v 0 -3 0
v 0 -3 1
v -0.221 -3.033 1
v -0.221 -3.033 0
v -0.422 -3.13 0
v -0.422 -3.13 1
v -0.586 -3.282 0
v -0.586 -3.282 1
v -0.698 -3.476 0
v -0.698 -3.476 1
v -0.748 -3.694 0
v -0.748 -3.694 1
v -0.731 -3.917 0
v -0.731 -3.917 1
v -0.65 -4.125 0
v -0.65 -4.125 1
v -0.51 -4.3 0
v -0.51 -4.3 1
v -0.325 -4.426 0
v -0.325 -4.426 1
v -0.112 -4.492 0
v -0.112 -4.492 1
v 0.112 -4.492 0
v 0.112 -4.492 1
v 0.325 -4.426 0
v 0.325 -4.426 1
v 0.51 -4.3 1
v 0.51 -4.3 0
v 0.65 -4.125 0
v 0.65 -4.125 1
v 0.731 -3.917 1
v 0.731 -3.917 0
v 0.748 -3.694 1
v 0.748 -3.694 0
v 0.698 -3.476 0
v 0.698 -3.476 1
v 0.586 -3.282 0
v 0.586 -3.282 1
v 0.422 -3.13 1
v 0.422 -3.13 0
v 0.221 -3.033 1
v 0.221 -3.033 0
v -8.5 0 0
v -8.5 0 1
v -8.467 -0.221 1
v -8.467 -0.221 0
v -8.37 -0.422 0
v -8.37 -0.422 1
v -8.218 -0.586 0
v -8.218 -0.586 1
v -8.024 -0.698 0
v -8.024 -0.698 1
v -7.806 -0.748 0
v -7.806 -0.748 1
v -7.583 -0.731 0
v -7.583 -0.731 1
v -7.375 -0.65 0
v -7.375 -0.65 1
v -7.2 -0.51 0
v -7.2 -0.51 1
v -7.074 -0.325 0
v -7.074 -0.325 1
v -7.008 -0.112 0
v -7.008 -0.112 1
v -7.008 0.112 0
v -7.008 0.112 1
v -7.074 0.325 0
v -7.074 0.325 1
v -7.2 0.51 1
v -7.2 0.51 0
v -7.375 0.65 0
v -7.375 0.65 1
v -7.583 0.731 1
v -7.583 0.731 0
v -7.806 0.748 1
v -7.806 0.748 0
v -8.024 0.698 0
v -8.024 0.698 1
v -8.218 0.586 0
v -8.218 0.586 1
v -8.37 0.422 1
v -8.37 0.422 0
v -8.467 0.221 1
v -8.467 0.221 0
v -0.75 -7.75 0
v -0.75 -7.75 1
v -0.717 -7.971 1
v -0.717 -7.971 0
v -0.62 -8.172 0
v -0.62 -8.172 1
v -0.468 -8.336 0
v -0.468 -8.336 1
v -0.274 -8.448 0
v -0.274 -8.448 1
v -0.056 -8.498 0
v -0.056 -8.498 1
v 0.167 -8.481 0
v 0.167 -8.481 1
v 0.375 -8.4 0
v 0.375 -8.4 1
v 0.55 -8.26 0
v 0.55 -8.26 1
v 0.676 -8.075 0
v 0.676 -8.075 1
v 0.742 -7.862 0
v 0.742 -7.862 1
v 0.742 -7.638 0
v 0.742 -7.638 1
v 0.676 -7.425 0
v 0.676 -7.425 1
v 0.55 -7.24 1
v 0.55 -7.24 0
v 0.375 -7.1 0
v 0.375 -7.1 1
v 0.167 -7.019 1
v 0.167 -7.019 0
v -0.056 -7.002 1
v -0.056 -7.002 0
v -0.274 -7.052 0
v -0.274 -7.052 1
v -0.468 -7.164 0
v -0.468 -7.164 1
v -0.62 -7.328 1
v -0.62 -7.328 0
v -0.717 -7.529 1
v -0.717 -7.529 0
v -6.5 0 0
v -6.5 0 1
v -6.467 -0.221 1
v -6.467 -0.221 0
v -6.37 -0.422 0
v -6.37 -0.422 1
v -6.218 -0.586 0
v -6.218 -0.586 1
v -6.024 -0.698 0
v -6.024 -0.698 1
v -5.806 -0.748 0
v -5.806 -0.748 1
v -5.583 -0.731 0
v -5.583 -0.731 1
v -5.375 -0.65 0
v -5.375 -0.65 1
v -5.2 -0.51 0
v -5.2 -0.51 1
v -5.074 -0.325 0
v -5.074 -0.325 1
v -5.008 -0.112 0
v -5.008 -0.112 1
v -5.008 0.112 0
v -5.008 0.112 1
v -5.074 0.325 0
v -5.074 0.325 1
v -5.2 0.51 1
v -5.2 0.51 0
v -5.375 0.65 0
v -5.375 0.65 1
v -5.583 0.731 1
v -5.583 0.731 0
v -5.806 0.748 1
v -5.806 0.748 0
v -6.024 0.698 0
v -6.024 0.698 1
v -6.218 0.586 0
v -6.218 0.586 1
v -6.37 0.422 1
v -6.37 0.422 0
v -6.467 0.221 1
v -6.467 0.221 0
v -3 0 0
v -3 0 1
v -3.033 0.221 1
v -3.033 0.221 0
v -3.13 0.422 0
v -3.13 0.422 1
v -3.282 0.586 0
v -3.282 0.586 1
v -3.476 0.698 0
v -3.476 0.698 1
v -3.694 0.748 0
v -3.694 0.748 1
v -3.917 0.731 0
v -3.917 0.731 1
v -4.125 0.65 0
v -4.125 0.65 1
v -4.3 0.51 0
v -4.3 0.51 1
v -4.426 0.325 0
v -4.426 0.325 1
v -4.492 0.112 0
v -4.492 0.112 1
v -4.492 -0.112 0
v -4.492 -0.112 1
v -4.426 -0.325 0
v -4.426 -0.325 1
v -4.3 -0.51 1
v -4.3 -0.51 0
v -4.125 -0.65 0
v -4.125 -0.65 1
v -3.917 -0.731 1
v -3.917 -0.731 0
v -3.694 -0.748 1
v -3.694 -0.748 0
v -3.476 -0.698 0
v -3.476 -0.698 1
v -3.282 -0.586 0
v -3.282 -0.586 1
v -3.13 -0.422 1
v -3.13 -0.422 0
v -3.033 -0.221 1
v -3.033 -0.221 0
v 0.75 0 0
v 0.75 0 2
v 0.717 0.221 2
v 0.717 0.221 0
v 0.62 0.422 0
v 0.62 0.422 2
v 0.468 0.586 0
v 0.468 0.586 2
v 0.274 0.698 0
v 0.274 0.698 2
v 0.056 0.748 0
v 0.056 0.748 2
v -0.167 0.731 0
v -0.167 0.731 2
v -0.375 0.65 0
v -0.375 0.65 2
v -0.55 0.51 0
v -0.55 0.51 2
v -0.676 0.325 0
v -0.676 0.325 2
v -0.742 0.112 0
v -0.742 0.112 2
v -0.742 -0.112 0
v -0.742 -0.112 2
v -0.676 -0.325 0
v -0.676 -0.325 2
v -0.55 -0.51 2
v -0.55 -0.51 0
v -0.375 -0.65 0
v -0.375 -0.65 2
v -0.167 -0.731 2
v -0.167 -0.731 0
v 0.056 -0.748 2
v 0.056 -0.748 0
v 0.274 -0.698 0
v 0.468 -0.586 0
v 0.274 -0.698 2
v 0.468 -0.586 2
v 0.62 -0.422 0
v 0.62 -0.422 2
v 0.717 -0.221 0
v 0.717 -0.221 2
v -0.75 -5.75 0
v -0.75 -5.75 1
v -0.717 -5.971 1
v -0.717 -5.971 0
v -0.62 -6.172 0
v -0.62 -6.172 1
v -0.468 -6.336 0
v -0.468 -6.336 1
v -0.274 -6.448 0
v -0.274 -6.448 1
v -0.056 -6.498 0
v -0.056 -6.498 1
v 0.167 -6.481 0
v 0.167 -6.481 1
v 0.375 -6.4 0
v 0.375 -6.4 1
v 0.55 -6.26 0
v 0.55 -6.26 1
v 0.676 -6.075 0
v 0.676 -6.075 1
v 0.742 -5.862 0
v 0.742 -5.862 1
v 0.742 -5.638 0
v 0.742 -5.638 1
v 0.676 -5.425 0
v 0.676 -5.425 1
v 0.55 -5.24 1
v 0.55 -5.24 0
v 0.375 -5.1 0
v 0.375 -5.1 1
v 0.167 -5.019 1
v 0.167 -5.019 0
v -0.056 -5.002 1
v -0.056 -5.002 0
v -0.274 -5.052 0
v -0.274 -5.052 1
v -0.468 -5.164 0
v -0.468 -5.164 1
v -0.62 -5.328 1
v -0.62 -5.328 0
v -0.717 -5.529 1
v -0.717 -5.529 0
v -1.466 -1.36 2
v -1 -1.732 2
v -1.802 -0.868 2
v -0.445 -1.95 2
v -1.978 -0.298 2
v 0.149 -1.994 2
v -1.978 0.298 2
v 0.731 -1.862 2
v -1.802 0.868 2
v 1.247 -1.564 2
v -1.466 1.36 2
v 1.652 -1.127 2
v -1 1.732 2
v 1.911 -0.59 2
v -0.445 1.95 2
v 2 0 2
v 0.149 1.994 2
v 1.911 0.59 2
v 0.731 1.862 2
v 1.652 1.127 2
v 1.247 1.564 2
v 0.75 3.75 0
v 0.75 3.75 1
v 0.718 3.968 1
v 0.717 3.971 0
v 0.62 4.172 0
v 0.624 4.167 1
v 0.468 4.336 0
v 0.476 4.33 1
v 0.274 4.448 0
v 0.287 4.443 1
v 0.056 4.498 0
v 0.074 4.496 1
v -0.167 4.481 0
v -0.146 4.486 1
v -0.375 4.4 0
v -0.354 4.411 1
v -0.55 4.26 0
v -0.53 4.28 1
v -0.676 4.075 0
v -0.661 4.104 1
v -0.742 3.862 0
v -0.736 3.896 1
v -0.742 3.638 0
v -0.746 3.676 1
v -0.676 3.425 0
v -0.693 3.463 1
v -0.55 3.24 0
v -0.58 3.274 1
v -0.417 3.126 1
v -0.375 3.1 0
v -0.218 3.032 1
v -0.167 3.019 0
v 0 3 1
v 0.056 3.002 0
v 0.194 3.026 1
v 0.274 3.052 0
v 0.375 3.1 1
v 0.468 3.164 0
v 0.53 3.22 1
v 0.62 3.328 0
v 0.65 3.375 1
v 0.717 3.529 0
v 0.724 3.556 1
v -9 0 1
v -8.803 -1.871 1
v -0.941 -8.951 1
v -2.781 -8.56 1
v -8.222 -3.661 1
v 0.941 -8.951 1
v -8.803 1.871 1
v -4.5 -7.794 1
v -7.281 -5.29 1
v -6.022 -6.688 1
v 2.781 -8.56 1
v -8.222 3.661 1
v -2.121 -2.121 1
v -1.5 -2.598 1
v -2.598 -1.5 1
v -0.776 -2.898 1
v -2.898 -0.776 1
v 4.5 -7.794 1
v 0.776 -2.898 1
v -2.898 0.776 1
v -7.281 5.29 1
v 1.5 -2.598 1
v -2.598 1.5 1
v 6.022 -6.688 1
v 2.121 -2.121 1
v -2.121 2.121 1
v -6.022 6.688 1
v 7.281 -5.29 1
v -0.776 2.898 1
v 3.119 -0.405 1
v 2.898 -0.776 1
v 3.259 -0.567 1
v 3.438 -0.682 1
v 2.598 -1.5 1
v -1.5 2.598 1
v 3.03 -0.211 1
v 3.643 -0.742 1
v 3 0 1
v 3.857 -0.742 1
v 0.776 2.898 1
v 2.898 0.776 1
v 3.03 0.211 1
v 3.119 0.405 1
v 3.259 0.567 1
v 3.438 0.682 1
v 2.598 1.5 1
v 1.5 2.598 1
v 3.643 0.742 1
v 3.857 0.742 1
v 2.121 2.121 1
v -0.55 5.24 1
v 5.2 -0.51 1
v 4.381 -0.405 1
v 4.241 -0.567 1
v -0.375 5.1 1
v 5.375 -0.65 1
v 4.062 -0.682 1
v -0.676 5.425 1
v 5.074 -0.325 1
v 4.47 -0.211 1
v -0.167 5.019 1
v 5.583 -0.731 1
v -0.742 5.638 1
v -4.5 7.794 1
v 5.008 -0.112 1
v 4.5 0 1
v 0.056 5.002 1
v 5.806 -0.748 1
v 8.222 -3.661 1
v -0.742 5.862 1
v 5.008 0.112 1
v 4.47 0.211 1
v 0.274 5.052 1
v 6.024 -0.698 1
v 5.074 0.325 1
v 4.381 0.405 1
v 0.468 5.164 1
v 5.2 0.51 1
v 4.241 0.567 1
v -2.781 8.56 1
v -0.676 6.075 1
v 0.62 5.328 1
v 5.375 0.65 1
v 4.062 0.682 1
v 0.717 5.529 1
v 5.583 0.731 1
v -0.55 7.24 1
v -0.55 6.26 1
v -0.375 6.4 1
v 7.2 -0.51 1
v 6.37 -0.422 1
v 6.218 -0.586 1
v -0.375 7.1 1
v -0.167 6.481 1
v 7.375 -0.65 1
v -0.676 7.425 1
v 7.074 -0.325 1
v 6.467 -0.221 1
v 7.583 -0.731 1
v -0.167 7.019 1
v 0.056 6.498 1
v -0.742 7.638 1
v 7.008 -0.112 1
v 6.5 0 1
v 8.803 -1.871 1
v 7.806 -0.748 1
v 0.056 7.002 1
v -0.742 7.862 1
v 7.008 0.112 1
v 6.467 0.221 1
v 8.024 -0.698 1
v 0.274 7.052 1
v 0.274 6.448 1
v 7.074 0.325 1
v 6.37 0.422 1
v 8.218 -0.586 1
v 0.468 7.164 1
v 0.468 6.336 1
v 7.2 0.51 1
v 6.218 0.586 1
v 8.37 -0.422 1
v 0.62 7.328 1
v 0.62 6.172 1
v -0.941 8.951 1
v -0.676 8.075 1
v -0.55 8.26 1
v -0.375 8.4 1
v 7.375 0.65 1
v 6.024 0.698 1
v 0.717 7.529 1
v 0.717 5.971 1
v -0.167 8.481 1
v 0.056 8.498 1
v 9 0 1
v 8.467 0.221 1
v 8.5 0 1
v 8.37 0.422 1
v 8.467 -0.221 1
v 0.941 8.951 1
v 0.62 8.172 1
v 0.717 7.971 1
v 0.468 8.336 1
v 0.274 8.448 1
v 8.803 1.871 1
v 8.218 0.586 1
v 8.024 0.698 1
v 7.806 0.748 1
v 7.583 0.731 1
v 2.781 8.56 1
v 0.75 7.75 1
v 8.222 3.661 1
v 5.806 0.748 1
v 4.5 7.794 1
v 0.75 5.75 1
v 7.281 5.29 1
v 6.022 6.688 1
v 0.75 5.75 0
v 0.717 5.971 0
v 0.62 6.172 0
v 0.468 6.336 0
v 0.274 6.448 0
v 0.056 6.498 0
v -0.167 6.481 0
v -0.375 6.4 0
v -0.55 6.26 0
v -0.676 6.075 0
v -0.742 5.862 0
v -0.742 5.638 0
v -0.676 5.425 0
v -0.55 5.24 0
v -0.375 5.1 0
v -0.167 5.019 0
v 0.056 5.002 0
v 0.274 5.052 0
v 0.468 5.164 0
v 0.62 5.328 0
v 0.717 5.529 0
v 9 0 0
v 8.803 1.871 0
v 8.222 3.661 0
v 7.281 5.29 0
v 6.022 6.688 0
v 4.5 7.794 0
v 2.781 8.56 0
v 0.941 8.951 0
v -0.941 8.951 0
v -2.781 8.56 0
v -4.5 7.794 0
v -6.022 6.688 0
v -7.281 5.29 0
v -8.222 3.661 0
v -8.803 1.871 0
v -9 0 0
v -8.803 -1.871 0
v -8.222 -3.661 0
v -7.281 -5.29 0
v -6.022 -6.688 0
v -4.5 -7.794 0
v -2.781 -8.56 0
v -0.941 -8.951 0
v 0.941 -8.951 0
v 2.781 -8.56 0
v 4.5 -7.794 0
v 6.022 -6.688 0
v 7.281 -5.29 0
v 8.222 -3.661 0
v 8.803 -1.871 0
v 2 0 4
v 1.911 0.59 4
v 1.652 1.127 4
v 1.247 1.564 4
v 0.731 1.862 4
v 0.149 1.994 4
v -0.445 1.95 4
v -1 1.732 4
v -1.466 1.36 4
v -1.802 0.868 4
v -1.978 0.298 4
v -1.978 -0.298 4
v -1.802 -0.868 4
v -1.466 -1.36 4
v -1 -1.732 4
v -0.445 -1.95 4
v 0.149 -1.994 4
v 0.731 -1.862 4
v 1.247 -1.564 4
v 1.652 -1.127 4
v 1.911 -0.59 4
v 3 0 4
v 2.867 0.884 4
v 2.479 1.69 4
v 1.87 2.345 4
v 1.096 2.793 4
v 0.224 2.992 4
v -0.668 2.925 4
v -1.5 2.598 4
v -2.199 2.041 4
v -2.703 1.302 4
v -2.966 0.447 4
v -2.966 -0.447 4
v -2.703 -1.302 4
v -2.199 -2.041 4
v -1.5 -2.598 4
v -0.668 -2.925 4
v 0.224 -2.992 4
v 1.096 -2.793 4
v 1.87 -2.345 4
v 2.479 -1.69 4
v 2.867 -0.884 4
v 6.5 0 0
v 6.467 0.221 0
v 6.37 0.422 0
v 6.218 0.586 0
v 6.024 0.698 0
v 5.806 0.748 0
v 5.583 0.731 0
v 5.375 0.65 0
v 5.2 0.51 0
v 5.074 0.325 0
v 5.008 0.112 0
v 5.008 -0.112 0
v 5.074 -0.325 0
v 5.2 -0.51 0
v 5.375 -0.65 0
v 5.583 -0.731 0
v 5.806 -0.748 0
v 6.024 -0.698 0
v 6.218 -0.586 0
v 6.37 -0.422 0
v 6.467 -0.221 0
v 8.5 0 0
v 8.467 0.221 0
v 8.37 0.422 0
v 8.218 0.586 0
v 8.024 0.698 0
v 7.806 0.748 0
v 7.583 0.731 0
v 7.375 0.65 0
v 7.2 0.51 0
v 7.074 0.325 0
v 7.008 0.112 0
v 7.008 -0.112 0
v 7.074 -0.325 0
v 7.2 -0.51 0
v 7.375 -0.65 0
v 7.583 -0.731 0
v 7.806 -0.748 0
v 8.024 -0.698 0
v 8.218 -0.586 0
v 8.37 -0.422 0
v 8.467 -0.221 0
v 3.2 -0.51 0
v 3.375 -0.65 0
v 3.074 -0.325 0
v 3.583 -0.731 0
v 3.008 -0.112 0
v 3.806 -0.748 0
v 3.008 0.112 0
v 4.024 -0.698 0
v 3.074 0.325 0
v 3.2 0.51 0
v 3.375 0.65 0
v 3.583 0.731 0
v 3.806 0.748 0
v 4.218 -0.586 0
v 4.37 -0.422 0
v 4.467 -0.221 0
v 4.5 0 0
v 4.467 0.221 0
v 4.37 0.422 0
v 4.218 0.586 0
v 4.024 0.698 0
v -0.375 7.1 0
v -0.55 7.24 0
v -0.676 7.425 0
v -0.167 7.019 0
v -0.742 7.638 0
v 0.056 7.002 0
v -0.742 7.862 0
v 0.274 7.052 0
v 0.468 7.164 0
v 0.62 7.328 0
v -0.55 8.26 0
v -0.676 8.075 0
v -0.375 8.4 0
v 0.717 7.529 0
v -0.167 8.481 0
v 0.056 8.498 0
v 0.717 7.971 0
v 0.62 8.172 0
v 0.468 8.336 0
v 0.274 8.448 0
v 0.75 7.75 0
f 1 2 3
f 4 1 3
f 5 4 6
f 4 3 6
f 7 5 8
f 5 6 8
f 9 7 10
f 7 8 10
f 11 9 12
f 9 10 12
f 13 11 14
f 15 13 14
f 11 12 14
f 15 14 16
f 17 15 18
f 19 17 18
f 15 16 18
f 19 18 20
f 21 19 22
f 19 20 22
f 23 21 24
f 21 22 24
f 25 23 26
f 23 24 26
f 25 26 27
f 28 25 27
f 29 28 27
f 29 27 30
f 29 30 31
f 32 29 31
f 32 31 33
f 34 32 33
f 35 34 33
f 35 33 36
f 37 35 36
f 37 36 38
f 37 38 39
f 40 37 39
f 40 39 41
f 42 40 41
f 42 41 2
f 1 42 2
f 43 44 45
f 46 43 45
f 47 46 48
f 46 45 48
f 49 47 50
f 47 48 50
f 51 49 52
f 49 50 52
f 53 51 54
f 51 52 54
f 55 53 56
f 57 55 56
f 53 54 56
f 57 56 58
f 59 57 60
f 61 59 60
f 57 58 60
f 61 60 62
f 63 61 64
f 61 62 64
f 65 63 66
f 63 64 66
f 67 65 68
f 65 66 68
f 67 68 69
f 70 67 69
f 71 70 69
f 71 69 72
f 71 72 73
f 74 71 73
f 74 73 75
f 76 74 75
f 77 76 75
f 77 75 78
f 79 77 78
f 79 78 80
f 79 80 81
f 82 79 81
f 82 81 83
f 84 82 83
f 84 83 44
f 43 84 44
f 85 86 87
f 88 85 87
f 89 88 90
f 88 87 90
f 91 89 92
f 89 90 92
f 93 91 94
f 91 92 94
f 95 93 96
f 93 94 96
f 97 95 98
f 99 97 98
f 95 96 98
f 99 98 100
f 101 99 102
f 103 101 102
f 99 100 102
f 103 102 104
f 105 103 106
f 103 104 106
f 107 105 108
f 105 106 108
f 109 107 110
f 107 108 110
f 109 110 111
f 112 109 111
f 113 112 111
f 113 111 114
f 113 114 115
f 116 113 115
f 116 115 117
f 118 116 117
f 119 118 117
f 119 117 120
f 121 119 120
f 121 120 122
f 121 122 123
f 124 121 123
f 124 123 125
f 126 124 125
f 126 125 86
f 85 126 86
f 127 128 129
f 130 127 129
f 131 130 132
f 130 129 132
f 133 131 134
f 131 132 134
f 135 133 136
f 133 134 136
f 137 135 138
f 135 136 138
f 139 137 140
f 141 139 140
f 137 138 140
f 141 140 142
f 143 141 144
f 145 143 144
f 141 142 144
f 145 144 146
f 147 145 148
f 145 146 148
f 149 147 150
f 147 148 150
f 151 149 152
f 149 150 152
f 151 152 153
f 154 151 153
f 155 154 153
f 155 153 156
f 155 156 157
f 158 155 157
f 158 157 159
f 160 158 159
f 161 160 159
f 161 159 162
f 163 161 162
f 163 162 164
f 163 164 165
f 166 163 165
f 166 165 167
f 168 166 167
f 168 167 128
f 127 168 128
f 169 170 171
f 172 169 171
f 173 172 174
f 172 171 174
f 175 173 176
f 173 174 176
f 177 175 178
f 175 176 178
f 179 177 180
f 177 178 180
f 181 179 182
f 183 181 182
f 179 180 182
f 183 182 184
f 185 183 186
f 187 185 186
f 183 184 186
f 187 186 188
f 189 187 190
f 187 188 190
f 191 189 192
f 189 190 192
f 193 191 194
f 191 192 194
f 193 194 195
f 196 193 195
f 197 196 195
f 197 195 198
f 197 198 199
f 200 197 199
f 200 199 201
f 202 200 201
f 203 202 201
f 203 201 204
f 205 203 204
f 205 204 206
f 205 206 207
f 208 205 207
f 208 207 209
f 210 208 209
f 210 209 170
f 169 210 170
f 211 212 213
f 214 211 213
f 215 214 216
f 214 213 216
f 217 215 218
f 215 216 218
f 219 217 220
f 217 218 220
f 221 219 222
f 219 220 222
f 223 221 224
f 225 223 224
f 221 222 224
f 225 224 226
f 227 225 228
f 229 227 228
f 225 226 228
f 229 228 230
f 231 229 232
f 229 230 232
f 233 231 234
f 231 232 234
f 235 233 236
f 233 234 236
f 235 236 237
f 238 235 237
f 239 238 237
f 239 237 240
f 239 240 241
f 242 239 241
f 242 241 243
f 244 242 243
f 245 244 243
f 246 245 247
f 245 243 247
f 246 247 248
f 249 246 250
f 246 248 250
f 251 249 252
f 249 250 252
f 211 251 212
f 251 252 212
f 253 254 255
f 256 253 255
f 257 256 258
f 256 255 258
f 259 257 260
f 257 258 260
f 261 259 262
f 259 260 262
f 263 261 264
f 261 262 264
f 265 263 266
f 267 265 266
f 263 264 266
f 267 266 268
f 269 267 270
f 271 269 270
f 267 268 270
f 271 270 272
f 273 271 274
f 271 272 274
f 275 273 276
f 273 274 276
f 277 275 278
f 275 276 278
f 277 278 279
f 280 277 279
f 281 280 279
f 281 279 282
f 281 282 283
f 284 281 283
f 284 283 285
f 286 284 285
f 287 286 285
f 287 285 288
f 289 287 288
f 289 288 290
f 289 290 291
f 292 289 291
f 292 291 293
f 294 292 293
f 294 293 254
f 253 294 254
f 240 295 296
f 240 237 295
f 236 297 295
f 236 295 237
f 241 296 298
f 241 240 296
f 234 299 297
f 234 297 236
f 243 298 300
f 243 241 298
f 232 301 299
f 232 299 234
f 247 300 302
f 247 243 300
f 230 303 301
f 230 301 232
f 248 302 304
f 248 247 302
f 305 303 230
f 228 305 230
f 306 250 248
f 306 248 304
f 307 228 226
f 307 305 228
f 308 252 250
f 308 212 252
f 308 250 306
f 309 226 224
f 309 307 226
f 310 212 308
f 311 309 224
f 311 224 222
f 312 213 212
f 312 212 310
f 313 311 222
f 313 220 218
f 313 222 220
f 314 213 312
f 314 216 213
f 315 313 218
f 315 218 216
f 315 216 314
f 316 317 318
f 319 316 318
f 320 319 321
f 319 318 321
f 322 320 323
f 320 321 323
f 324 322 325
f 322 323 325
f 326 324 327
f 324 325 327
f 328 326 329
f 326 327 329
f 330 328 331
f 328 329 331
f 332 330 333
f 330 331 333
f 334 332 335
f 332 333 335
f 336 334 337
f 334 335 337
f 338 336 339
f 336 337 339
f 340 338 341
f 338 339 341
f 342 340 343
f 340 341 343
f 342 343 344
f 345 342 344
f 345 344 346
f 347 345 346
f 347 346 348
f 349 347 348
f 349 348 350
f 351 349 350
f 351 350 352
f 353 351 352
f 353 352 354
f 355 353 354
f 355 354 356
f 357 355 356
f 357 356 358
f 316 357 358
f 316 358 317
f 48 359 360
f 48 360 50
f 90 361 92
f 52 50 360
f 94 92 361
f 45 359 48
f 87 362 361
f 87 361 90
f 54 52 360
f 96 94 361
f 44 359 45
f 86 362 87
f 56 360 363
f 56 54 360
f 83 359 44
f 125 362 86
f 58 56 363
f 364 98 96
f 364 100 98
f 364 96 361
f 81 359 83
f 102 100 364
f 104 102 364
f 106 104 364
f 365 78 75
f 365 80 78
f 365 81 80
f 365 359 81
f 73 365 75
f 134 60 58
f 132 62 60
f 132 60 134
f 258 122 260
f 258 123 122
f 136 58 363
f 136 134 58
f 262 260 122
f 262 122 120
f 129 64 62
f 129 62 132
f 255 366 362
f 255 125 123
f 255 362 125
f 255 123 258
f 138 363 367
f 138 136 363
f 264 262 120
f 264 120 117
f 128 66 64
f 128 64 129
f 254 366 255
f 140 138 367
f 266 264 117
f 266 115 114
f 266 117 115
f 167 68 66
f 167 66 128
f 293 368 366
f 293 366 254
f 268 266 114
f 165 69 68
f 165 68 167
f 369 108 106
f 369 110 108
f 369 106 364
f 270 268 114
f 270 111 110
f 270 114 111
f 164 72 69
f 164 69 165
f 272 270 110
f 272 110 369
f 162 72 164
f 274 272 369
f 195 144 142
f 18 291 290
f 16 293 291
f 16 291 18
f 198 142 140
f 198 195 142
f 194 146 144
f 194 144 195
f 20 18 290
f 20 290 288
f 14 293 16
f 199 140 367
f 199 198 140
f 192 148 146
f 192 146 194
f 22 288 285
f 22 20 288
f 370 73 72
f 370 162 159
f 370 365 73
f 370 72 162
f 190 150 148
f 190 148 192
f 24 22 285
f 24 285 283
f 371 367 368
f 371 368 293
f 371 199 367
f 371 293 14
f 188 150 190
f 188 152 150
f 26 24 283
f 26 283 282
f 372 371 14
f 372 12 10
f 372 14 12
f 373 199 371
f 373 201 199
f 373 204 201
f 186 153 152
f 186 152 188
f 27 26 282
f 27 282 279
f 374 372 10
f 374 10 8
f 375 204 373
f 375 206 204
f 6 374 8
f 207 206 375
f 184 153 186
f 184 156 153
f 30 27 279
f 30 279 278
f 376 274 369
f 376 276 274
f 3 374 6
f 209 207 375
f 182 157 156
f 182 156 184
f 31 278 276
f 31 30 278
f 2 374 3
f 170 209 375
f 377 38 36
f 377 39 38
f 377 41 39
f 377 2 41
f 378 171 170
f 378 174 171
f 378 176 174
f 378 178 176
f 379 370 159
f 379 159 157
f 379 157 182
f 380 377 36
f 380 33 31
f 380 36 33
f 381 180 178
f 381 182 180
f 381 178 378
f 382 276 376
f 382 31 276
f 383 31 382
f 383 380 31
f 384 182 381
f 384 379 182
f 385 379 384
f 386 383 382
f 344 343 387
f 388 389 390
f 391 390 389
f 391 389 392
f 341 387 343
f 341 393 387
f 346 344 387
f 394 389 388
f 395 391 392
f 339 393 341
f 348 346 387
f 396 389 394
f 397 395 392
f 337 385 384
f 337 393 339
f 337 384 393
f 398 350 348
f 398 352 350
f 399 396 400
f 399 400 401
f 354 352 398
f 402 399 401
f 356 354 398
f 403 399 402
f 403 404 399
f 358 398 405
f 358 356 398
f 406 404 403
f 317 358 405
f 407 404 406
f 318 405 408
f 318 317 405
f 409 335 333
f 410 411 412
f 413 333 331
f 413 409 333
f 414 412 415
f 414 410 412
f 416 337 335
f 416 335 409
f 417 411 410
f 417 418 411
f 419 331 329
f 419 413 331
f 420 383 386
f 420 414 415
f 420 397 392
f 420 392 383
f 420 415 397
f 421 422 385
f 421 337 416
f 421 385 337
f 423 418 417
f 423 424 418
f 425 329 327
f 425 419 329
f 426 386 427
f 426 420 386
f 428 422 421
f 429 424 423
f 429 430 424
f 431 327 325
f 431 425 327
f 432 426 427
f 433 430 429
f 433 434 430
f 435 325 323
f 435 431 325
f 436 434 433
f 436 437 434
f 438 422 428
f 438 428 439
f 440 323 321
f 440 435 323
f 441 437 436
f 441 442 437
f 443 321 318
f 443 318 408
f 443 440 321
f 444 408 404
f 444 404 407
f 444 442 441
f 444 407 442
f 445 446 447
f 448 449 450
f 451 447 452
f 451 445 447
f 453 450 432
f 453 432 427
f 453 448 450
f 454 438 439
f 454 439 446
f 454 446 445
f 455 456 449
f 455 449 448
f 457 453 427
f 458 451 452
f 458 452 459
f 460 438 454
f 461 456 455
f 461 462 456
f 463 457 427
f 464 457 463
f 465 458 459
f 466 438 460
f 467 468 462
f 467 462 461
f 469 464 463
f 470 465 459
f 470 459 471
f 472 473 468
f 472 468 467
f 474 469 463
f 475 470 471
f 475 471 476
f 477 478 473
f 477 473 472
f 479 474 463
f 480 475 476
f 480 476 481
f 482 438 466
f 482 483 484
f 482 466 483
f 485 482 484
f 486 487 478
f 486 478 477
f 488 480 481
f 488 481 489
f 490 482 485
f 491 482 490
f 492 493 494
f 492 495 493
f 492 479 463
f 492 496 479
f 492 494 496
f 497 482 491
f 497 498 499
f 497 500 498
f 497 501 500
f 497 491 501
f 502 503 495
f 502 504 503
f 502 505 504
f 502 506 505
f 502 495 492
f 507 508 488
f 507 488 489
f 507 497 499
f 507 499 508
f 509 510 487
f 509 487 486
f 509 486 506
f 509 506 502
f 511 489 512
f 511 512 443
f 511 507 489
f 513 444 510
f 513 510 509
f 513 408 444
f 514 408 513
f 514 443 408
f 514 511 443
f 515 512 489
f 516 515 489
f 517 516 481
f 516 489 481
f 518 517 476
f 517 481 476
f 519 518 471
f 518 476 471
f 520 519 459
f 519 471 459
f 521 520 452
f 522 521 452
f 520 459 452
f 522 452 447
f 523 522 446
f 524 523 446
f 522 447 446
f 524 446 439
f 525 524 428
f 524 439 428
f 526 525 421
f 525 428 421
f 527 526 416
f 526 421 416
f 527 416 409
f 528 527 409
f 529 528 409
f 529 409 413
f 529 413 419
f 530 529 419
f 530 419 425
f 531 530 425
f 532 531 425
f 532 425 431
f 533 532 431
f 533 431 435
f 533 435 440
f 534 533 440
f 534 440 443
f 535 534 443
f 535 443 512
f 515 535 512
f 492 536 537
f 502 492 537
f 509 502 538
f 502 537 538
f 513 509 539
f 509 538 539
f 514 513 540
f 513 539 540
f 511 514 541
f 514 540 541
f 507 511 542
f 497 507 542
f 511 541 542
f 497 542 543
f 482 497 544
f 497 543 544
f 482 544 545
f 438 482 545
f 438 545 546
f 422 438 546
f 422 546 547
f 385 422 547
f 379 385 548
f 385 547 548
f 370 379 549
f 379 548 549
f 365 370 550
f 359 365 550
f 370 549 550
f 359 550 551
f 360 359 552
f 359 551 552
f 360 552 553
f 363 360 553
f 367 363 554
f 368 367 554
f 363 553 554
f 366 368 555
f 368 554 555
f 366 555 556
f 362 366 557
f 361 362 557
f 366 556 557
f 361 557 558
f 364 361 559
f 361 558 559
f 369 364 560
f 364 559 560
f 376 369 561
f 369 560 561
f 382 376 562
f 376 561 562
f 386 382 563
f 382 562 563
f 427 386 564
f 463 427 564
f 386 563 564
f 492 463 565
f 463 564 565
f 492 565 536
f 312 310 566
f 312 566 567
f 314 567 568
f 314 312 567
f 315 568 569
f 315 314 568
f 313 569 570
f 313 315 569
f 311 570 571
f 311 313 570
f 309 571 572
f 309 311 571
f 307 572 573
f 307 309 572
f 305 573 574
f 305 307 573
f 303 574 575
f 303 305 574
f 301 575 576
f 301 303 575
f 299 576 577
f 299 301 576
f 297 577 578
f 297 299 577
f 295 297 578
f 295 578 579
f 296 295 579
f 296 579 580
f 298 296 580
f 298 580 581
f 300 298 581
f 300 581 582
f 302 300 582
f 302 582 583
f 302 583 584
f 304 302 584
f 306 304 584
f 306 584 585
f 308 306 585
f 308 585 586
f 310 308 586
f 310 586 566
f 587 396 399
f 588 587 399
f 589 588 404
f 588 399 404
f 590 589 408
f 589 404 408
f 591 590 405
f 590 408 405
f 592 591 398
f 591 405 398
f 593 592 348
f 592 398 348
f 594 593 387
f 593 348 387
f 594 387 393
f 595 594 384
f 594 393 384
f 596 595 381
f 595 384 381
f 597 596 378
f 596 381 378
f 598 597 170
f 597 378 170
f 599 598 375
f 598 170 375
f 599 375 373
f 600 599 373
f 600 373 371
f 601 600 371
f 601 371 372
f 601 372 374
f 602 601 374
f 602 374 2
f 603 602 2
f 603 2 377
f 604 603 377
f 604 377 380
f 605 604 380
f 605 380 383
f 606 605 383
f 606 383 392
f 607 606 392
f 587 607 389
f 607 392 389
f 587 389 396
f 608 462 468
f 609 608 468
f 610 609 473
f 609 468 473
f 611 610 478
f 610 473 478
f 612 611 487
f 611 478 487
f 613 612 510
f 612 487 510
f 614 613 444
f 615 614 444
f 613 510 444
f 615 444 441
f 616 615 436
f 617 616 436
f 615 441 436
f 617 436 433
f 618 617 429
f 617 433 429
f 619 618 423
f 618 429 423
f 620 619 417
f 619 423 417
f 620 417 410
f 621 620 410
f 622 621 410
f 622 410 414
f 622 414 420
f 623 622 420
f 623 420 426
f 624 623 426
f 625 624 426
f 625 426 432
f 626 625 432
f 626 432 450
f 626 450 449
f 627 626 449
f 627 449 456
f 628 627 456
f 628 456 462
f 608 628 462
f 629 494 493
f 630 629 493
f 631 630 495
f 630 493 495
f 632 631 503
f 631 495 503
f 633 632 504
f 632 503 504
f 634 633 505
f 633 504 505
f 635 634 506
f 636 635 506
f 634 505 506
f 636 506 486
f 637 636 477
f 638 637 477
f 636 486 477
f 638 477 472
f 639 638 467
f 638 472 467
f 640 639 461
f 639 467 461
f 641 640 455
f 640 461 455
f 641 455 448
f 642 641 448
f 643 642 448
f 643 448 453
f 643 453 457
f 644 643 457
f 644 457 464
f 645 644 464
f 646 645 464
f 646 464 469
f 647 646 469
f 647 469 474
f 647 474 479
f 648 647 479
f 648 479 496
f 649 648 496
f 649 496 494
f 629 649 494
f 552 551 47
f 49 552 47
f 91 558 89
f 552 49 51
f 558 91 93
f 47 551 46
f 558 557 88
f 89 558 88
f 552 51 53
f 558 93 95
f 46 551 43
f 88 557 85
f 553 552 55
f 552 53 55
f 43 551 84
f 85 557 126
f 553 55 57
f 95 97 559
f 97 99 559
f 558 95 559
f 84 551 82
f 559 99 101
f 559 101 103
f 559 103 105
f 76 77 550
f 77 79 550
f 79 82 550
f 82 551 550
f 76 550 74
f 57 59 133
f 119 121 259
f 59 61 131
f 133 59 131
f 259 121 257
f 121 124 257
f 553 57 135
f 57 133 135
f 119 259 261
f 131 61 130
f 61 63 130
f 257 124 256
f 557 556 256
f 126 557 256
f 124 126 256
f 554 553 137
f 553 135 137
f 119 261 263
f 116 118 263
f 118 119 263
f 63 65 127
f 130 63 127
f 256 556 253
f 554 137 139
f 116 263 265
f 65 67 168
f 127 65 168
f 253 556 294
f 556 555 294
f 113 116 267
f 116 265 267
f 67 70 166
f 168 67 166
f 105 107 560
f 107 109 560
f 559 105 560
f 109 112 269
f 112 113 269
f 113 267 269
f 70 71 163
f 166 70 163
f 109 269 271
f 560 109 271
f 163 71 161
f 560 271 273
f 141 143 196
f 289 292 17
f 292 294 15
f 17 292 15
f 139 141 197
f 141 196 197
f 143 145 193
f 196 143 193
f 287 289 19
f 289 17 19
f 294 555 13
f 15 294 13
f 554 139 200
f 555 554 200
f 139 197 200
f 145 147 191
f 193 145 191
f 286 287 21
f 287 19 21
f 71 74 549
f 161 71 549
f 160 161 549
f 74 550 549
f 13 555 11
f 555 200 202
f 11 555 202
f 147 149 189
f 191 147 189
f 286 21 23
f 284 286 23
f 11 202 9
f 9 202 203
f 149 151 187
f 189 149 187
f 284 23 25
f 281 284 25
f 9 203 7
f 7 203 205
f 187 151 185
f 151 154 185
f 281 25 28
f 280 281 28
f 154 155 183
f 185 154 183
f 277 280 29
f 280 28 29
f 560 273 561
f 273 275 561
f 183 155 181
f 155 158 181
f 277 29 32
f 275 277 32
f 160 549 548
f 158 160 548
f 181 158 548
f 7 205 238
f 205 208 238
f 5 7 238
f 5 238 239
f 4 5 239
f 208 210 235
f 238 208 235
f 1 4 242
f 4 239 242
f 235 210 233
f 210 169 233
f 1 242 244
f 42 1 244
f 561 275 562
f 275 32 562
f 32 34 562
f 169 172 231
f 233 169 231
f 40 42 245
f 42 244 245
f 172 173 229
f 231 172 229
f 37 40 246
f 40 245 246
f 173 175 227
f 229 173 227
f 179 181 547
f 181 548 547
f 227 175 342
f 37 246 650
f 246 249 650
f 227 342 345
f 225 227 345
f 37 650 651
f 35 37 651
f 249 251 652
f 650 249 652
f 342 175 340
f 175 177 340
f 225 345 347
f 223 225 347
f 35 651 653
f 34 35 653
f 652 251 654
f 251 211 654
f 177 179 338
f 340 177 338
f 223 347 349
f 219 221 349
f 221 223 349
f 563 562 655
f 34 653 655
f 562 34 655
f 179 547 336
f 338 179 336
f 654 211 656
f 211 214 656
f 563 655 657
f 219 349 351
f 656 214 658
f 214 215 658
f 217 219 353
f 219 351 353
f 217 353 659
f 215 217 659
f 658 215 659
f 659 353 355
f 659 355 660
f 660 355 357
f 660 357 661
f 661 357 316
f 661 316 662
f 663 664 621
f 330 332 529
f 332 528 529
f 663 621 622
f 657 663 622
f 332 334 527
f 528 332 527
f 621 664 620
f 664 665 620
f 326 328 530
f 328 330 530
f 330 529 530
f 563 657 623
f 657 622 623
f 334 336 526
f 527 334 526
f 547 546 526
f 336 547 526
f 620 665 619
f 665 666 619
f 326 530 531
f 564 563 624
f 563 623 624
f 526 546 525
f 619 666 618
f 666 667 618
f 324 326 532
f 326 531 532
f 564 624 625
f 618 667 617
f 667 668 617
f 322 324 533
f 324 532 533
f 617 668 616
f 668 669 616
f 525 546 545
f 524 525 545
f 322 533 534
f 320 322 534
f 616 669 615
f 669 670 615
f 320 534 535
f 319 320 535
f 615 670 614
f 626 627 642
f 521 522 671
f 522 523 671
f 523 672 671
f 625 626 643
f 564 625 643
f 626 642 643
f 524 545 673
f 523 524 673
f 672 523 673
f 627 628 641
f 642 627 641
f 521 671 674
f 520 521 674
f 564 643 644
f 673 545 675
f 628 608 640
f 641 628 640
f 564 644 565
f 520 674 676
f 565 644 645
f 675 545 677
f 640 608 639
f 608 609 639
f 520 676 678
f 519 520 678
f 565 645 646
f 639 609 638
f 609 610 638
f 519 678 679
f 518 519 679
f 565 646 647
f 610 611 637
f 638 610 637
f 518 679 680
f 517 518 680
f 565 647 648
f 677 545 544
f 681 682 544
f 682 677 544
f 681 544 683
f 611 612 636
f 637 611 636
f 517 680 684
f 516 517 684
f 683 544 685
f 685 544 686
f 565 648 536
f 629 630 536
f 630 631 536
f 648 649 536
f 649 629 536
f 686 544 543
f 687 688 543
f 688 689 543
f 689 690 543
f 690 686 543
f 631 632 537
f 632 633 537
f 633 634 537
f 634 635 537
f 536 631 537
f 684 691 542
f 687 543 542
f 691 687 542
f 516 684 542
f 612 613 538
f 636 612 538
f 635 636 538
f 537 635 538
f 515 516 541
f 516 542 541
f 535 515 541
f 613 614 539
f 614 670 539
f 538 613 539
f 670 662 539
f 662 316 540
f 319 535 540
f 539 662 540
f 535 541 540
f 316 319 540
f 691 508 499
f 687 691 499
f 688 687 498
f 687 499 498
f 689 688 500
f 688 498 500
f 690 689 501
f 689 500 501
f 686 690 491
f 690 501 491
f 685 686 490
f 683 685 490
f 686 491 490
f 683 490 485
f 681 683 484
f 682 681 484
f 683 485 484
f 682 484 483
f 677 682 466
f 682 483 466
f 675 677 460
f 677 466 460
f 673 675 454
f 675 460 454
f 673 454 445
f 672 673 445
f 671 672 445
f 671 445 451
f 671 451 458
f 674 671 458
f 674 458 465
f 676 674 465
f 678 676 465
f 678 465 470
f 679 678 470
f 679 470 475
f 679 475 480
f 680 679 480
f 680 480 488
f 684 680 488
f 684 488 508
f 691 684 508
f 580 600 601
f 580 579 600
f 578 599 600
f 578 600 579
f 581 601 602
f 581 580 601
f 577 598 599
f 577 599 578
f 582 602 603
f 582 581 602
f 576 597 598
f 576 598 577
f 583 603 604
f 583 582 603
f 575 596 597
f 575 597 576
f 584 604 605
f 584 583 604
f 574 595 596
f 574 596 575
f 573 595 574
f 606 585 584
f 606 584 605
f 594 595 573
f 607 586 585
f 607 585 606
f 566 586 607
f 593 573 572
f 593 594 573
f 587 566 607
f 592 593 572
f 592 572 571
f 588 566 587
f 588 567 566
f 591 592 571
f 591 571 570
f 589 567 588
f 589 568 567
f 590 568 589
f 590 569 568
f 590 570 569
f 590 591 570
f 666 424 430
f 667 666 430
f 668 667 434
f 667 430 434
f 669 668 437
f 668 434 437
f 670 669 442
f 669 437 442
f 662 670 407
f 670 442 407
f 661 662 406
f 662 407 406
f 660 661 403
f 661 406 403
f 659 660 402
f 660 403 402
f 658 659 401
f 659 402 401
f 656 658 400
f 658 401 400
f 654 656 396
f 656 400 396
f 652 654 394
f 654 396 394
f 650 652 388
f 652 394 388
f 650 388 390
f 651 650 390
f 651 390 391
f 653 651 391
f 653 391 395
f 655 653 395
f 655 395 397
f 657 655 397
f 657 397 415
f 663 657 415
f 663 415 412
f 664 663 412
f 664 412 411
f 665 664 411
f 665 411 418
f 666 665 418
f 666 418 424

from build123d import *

# Parameters (mm, degrees)
SKETCH1_R           = 9
SKETCH1_R_2         = 3
BOSS_EXTRUDE1_DEPTH = 1
SKETCH1_3_R         = 3
SKETCH1_3_R_2       = 2
BOSS_EXTRUDE2_DEPTH = 4
SKETCH1_4_R         = 2
BOSS_EXTRUDE3_DEPTH = 2
SKETCH2_R           = 0.75
CUT_EXTRUDE1_DEPTH  = 2
SKETCH3_R           = 0.75
CUT_EXTRUDE2_DEPTH  = 14.076696831


with BuildPart() as part:
    # Sketch1 → Boss-Extrude1 (new body)
    with BuildSketch(Plane.XY):
        Circle(SKETCH1_R)
        Circle(SKETCH1_R_2, mode=Mode.SUBTRACT)
    extrude(amount=BOSS_EXTRUDE1_DEPTH)

    # Sketch1<3> → Boss-Extrude2 (add)
    with BuildSketch(Plane.XY):
        Circle(SKETCH1_3_R)
        Circle(SKETCH1_3_R_2, mode=Mode.SUBTRACT)
    extrude(amount=BOSS_EXTRUDE2_DEPTH)

    # Sketch1<4> → Boss-Extrude3 (add)
    with BuildSketch(Plane.XY):
        Circle(SKETCH1_4_R)
    extrude(amount=BOSS_EXTRUDE3_DEPTH)

    # Sketch2 → Cut-Extrude1 (cut)
    with BuildSketch(Plane.XY.offset(2)):
        Circle(SKETCH2_R)
    extrude(amount=-CUT_EXTRUDE1_DEPTH, mode=Mode.SUBTRACT)

    # Sketch3 → Cut-Extrude2 (cut, through all)
    with BuildSketch(Plane.XY.offset(1)):
        with Locations((3.75, 0)):
            Circle(SKETCH3_R)
        with Locations((5.75, 0)):
            Circle(SKETCH3_R)
        with Locations((7.75, 0)):
            Circle(SKETCH3_R)
        with Locations((-3.75, 0)):
            Circle(SKETCH3_R)
        with Locations((-5.75, 0)):
            Circle(SKETCH3_R)
        with Locations((-7.75, 0)):
            Circle(SKETCH3_R)
        with Locations((0, 3.75)):
            Circle(SKETCH3_R)
        with Locations((0, 5.75)):
            Circle(SKETCH3_R)
        with Locations((0, 7.75)):
            Circle(SKETCH3_R)
        with Locations((0, -3.75)):
            Circle(SKETCH3_R)
        with Locations((0, -5.75)):
            Circle(SKETCH3_R)
        with Locations((0, -7.75)):
            Circle(SKETCH3_R)
    extrude(amount=-CUT_EXTRUDE2_DEPTH, mode=Mode.SUBTRACT)


solid = part.part
